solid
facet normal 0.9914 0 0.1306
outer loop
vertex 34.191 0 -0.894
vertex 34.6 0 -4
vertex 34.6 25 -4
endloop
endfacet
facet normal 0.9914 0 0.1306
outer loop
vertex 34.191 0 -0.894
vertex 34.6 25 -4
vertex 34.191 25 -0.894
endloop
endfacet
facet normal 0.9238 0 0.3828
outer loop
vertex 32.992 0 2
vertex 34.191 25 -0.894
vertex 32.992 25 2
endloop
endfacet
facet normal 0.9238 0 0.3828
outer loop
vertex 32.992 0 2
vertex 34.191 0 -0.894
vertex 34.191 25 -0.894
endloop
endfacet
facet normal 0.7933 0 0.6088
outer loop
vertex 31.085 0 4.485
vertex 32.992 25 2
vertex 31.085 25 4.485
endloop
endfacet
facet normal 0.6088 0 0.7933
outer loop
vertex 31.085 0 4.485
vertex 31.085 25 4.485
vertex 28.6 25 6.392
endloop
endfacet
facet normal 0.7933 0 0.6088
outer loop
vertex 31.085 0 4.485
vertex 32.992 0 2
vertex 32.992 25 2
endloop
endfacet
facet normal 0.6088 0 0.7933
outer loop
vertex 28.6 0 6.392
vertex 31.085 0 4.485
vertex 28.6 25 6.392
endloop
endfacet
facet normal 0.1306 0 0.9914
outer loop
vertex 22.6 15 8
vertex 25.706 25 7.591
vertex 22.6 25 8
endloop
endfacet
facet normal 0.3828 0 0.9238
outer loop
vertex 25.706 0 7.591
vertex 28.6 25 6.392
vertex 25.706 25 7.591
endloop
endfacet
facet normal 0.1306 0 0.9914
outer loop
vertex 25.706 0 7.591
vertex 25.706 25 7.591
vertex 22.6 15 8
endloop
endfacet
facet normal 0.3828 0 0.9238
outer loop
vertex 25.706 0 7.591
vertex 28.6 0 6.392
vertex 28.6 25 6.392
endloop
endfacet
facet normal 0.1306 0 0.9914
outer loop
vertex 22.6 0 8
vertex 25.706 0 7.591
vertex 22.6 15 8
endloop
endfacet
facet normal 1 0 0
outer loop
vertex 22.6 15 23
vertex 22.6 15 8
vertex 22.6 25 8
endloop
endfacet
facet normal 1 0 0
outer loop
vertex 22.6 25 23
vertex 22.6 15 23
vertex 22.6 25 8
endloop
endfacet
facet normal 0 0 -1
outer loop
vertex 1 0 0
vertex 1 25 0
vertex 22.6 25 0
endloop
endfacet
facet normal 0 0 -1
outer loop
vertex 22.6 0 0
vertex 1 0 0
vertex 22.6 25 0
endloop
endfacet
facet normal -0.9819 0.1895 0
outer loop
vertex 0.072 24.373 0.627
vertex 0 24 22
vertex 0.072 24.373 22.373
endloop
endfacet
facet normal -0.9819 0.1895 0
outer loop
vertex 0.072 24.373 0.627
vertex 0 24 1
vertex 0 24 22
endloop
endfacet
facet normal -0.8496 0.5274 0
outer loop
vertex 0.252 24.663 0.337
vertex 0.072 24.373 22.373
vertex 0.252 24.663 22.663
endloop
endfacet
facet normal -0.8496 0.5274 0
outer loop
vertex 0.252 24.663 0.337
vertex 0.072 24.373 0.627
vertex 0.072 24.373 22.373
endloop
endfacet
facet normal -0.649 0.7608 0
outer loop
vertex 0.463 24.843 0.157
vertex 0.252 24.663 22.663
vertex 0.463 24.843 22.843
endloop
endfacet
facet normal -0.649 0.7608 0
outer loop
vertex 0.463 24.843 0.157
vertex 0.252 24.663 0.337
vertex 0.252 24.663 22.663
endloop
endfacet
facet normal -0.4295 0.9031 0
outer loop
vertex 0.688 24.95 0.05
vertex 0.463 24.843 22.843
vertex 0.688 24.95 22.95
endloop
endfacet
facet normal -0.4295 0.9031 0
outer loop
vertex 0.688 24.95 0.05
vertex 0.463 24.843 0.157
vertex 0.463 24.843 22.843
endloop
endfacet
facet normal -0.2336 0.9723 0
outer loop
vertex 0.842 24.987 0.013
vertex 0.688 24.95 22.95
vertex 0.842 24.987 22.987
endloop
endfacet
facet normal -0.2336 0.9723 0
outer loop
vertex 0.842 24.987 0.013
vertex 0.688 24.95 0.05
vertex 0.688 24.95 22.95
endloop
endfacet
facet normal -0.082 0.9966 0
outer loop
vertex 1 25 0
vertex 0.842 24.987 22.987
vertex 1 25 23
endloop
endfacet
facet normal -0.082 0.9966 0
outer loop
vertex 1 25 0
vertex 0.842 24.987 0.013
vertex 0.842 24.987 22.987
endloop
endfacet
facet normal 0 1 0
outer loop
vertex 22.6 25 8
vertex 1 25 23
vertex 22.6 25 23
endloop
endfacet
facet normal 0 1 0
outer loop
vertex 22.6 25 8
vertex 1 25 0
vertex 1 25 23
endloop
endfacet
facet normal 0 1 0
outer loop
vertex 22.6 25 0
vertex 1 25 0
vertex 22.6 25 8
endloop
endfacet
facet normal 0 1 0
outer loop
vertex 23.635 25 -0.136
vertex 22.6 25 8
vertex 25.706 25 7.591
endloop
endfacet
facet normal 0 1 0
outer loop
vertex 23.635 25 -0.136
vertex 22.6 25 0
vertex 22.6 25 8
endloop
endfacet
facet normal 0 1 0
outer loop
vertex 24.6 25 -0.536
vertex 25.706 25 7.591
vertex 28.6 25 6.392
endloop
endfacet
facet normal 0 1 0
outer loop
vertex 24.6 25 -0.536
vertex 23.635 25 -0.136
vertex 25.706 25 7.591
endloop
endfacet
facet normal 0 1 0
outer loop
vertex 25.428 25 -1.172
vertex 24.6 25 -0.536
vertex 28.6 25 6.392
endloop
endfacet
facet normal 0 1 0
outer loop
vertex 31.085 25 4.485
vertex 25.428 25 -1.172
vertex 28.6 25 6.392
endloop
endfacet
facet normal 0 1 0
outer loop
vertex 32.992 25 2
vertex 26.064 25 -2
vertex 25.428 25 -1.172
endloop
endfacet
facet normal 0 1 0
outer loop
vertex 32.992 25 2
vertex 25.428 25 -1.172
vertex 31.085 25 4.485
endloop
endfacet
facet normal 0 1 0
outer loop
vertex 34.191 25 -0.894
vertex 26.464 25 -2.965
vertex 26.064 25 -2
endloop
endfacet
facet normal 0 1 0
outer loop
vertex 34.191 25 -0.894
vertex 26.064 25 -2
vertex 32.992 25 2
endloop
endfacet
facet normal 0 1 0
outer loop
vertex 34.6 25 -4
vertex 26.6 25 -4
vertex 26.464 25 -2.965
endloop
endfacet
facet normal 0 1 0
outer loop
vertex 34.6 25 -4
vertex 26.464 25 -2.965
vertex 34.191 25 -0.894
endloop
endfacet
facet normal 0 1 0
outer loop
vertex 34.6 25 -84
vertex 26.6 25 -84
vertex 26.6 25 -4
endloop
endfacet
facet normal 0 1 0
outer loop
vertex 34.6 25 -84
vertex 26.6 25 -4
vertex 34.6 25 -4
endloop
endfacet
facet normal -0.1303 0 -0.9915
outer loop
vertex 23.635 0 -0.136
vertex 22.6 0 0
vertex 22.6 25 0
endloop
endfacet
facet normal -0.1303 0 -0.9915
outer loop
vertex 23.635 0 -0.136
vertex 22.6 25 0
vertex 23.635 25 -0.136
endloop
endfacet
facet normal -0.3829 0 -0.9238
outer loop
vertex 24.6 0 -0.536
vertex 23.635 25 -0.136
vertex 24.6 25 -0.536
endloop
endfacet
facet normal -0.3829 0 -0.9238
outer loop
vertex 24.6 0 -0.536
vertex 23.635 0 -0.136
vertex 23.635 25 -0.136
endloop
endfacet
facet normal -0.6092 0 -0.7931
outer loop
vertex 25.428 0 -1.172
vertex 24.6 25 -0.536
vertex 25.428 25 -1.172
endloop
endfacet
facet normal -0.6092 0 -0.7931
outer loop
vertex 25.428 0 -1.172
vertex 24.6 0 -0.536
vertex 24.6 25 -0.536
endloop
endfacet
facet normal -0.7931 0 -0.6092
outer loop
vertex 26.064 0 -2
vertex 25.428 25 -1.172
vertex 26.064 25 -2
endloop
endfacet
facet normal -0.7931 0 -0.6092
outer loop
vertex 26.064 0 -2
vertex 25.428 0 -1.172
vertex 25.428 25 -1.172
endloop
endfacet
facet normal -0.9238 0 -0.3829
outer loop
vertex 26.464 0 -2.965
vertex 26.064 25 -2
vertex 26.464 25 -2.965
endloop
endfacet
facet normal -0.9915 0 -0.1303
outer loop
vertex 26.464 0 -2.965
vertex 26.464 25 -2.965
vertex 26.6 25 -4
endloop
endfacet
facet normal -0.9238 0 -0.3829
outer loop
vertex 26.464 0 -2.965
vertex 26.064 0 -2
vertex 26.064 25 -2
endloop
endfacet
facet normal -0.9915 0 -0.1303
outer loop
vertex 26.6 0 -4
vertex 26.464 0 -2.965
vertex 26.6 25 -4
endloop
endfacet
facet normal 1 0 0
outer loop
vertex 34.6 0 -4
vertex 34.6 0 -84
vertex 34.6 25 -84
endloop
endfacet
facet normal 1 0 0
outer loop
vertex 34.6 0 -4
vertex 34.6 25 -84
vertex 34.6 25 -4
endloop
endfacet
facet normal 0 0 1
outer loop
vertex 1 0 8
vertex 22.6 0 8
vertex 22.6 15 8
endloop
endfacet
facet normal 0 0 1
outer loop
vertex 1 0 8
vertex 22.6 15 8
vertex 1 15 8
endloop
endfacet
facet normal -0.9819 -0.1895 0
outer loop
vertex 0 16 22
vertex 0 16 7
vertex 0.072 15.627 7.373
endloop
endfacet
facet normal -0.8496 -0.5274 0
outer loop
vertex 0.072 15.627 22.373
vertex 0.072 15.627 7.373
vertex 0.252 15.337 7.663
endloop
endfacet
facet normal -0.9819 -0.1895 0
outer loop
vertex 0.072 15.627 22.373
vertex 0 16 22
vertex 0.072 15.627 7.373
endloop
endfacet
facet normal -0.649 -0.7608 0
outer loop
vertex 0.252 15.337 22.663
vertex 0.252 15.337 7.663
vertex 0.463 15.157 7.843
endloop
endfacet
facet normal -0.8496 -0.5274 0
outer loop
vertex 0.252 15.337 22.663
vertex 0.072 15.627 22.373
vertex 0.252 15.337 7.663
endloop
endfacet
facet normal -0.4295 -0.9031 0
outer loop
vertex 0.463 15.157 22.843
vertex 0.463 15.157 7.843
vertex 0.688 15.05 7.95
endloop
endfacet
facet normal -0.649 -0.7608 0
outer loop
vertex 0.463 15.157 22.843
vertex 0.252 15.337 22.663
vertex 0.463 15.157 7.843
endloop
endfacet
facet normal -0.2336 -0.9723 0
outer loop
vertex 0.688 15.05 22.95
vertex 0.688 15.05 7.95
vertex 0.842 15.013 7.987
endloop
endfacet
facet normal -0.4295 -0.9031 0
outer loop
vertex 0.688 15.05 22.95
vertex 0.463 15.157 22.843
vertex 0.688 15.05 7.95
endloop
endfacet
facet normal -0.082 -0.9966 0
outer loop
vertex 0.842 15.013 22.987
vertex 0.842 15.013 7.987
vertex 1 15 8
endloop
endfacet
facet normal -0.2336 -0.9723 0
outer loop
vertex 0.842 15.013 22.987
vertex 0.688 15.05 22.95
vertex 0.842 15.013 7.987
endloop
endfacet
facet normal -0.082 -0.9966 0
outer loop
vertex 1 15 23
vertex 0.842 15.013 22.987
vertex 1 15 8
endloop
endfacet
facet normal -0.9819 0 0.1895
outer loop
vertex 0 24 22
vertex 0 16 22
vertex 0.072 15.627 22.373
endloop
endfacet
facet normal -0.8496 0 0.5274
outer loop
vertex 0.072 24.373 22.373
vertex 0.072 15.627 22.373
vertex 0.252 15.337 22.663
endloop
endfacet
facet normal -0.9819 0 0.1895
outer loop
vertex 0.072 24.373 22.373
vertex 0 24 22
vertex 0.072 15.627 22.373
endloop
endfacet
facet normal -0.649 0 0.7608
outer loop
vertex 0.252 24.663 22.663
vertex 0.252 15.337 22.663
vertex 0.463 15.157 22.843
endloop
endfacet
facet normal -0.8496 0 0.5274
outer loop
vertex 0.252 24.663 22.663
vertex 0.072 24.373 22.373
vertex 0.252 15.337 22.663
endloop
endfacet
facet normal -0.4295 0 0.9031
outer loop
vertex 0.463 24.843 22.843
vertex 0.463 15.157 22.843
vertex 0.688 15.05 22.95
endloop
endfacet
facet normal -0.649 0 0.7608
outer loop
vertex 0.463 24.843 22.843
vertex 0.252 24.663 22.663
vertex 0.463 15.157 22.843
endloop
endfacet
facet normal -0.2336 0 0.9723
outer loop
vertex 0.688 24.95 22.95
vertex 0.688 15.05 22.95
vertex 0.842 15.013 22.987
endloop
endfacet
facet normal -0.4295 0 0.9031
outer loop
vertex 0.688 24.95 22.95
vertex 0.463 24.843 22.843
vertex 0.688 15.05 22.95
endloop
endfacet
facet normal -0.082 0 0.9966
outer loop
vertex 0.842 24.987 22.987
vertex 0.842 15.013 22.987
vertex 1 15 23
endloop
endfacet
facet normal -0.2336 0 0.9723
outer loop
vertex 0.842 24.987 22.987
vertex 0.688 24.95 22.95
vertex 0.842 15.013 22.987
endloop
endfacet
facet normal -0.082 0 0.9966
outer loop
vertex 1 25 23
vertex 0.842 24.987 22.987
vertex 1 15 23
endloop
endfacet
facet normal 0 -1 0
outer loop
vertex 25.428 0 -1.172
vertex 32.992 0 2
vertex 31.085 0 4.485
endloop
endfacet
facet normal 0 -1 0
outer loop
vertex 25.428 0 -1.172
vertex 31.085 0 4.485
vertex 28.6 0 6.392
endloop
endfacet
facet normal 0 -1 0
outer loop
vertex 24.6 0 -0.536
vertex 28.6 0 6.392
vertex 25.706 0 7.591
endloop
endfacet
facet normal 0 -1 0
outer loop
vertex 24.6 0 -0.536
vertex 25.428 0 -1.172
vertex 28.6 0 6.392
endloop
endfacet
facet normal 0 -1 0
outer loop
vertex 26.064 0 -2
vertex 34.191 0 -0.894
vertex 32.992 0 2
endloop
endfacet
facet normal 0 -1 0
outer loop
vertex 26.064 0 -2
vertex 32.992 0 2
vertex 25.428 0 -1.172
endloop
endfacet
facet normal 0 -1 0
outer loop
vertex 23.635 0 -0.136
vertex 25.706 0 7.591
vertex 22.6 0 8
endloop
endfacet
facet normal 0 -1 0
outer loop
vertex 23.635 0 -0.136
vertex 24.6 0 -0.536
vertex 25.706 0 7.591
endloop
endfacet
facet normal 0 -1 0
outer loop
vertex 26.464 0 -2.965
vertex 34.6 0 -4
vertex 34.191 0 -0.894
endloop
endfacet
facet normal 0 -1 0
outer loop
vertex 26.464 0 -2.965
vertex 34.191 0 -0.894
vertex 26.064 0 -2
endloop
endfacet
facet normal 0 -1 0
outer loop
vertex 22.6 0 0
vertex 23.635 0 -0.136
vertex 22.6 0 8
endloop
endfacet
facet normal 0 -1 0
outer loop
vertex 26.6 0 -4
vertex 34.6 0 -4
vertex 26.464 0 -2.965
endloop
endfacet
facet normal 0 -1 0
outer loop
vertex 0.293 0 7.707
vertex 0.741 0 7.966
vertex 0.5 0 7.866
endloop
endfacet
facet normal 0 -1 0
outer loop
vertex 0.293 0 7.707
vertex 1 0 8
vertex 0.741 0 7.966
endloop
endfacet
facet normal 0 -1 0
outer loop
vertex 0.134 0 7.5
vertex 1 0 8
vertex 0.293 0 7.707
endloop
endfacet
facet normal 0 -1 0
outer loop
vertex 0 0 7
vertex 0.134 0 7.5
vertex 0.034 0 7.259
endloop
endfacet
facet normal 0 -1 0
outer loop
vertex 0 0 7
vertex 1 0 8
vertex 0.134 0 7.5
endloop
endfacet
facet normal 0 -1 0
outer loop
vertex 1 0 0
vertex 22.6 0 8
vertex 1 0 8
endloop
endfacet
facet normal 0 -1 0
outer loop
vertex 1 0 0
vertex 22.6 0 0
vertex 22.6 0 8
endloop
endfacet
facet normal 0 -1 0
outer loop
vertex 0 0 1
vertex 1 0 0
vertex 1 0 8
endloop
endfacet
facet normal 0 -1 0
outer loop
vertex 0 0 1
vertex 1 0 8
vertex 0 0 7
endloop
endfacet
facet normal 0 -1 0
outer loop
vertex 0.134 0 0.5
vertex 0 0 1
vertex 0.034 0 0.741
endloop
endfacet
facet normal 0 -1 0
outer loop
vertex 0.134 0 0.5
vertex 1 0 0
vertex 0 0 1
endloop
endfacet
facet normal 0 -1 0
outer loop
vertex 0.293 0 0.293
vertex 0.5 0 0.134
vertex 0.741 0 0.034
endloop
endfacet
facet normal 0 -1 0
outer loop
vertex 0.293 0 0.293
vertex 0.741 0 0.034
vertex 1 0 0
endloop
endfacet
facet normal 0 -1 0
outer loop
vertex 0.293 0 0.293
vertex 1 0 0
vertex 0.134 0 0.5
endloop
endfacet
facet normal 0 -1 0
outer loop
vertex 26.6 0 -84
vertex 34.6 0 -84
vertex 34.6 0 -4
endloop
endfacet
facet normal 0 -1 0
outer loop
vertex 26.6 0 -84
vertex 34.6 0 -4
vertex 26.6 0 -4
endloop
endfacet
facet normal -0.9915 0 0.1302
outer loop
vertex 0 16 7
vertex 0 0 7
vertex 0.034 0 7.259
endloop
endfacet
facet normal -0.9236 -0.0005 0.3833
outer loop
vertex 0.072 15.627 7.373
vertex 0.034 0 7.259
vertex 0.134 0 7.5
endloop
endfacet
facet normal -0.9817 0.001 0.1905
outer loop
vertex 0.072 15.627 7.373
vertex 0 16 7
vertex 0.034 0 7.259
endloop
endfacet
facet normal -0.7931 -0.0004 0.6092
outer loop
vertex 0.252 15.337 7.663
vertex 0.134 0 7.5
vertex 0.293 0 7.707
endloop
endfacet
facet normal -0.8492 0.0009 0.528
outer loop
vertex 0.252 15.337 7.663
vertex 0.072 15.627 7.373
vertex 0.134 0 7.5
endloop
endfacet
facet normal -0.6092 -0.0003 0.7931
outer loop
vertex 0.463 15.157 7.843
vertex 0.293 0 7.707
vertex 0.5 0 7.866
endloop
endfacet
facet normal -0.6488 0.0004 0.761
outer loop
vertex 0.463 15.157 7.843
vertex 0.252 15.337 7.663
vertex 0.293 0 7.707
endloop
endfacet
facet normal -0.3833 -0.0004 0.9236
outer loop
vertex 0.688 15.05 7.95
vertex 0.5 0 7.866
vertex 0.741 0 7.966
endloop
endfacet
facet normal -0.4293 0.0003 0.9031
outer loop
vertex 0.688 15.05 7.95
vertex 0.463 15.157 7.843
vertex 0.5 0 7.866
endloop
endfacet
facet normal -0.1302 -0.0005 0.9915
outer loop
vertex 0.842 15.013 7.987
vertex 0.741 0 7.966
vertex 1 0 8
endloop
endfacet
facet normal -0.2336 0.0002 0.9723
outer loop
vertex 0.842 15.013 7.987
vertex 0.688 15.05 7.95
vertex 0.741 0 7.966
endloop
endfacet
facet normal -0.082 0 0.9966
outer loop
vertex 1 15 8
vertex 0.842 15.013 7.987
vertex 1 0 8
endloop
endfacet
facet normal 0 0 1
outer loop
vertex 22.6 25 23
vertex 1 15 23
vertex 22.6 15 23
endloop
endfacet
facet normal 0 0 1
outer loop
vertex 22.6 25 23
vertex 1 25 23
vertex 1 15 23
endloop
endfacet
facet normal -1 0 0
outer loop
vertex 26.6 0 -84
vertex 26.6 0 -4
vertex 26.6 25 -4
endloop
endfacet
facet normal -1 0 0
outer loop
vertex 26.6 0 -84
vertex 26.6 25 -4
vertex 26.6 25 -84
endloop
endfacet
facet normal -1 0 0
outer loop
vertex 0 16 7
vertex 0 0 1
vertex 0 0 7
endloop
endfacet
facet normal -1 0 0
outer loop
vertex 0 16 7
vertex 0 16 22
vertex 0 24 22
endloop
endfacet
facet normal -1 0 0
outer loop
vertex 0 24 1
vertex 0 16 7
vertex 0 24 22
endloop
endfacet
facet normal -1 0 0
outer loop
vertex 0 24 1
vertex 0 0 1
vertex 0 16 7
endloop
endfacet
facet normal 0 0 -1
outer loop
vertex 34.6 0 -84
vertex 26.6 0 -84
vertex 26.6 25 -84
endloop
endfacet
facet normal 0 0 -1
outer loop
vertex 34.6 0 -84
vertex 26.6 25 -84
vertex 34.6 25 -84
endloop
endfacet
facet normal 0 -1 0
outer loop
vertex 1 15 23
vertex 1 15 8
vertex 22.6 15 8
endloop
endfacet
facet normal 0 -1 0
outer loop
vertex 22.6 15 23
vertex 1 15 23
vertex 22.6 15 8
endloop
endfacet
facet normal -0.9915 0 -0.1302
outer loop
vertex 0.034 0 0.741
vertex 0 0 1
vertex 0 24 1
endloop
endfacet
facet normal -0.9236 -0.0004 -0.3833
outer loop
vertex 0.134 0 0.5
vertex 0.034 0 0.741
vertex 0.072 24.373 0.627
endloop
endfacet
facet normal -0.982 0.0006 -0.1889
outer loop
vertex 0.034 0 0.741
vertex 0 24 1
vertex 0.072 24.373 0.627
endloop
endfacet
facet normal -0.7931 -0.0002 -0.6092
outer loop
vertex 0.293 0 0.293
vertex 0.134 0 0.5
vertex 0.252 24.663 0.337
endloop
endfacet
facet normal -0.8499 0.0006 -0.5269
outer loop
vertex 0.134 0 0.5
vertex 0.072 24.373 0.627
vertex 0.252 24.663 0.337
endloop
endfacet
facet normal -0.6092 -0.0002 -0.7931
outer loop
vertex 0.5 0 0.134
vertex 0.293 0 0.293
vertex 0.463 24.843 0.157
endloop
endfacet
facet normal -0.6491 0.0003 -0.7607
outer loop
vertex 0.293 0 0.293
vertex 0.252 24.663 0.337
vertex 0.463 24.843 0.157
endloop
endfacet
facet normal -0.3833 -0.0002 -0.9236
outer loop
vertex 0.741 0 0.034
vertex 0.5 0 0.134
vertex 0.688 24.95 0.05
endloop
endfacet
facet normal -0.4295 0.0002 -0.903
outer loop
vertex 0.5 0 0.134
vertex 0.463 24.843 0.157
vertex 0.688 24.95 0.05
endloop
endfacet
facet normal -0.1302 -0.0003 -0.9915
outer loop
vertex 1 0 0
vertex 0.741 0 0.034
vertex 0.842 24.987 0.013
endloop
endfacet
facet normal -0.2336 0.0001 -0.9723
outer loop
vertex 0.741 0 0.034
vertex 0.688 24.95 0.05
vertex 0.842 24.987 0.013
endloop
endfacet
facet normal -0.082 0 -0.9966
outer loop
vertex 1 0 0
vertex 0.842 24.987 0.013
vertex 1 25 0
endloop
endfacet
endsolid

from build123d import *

# Parameters (mm, degrees)
EXTRUDE_1_DEPTH = 25
SKETCH_2_W      = 22.6
SKETCH_2_H      = 10
EXTRUDE_2_DEPTH = 15
FILLET_1_R      = 1


with BuildPart() as part:
    # 草图1 → 凸台-拉伸1 (new body)
    with BuildSketch(Plane(origin=(0, 0, 0), x_dir=(1, 0, 0), z_dir=(0, 1, 0))):
        with BuildLine():
            Line((0, 0), (22.6, 0))
            ThreePointArc((22.6, 0), (25.428427125, 1.171572875), (26.6, 4))
            Line((26.6, 4), (26.6, 84))
            Line((26.6, 84), (34.6, 84))
            Line((34.6, 84), (34.6, 4))
            ThreePointArc((34.6, 4), (31.085281374, -4.485281374), (22.6, -8))
            Line((22.6, -8), (0, -8))
            Line((0, -8), (0, 0))
        make_face()
    extrude(amount=EXTRUDE_1_DEPTH)

    # 草图2 → 凸台-拉伸2 (add)
    with BuildSketch(Plane.XY.offset(8)):
        with Locations((11.3, 20)):
            Rectangle(SKETCH_2_W, SKETCH_2_H)
    extrude(amount=EXTRUDE_2_DEPTH)

    # 圆角1
    fillet_1_edges = [part.edges().sort_by_distance(p)[0] for p in [
        (0, 25, 11.5),
        (0, 12.5, 0),
        (0, 7.5, 8),
        (0, 15, 15.5),
        (0, 20, 23),
    ]]
    fillet(fillet_1_edges, radius=FILLET_1_R)


solid = part.part
